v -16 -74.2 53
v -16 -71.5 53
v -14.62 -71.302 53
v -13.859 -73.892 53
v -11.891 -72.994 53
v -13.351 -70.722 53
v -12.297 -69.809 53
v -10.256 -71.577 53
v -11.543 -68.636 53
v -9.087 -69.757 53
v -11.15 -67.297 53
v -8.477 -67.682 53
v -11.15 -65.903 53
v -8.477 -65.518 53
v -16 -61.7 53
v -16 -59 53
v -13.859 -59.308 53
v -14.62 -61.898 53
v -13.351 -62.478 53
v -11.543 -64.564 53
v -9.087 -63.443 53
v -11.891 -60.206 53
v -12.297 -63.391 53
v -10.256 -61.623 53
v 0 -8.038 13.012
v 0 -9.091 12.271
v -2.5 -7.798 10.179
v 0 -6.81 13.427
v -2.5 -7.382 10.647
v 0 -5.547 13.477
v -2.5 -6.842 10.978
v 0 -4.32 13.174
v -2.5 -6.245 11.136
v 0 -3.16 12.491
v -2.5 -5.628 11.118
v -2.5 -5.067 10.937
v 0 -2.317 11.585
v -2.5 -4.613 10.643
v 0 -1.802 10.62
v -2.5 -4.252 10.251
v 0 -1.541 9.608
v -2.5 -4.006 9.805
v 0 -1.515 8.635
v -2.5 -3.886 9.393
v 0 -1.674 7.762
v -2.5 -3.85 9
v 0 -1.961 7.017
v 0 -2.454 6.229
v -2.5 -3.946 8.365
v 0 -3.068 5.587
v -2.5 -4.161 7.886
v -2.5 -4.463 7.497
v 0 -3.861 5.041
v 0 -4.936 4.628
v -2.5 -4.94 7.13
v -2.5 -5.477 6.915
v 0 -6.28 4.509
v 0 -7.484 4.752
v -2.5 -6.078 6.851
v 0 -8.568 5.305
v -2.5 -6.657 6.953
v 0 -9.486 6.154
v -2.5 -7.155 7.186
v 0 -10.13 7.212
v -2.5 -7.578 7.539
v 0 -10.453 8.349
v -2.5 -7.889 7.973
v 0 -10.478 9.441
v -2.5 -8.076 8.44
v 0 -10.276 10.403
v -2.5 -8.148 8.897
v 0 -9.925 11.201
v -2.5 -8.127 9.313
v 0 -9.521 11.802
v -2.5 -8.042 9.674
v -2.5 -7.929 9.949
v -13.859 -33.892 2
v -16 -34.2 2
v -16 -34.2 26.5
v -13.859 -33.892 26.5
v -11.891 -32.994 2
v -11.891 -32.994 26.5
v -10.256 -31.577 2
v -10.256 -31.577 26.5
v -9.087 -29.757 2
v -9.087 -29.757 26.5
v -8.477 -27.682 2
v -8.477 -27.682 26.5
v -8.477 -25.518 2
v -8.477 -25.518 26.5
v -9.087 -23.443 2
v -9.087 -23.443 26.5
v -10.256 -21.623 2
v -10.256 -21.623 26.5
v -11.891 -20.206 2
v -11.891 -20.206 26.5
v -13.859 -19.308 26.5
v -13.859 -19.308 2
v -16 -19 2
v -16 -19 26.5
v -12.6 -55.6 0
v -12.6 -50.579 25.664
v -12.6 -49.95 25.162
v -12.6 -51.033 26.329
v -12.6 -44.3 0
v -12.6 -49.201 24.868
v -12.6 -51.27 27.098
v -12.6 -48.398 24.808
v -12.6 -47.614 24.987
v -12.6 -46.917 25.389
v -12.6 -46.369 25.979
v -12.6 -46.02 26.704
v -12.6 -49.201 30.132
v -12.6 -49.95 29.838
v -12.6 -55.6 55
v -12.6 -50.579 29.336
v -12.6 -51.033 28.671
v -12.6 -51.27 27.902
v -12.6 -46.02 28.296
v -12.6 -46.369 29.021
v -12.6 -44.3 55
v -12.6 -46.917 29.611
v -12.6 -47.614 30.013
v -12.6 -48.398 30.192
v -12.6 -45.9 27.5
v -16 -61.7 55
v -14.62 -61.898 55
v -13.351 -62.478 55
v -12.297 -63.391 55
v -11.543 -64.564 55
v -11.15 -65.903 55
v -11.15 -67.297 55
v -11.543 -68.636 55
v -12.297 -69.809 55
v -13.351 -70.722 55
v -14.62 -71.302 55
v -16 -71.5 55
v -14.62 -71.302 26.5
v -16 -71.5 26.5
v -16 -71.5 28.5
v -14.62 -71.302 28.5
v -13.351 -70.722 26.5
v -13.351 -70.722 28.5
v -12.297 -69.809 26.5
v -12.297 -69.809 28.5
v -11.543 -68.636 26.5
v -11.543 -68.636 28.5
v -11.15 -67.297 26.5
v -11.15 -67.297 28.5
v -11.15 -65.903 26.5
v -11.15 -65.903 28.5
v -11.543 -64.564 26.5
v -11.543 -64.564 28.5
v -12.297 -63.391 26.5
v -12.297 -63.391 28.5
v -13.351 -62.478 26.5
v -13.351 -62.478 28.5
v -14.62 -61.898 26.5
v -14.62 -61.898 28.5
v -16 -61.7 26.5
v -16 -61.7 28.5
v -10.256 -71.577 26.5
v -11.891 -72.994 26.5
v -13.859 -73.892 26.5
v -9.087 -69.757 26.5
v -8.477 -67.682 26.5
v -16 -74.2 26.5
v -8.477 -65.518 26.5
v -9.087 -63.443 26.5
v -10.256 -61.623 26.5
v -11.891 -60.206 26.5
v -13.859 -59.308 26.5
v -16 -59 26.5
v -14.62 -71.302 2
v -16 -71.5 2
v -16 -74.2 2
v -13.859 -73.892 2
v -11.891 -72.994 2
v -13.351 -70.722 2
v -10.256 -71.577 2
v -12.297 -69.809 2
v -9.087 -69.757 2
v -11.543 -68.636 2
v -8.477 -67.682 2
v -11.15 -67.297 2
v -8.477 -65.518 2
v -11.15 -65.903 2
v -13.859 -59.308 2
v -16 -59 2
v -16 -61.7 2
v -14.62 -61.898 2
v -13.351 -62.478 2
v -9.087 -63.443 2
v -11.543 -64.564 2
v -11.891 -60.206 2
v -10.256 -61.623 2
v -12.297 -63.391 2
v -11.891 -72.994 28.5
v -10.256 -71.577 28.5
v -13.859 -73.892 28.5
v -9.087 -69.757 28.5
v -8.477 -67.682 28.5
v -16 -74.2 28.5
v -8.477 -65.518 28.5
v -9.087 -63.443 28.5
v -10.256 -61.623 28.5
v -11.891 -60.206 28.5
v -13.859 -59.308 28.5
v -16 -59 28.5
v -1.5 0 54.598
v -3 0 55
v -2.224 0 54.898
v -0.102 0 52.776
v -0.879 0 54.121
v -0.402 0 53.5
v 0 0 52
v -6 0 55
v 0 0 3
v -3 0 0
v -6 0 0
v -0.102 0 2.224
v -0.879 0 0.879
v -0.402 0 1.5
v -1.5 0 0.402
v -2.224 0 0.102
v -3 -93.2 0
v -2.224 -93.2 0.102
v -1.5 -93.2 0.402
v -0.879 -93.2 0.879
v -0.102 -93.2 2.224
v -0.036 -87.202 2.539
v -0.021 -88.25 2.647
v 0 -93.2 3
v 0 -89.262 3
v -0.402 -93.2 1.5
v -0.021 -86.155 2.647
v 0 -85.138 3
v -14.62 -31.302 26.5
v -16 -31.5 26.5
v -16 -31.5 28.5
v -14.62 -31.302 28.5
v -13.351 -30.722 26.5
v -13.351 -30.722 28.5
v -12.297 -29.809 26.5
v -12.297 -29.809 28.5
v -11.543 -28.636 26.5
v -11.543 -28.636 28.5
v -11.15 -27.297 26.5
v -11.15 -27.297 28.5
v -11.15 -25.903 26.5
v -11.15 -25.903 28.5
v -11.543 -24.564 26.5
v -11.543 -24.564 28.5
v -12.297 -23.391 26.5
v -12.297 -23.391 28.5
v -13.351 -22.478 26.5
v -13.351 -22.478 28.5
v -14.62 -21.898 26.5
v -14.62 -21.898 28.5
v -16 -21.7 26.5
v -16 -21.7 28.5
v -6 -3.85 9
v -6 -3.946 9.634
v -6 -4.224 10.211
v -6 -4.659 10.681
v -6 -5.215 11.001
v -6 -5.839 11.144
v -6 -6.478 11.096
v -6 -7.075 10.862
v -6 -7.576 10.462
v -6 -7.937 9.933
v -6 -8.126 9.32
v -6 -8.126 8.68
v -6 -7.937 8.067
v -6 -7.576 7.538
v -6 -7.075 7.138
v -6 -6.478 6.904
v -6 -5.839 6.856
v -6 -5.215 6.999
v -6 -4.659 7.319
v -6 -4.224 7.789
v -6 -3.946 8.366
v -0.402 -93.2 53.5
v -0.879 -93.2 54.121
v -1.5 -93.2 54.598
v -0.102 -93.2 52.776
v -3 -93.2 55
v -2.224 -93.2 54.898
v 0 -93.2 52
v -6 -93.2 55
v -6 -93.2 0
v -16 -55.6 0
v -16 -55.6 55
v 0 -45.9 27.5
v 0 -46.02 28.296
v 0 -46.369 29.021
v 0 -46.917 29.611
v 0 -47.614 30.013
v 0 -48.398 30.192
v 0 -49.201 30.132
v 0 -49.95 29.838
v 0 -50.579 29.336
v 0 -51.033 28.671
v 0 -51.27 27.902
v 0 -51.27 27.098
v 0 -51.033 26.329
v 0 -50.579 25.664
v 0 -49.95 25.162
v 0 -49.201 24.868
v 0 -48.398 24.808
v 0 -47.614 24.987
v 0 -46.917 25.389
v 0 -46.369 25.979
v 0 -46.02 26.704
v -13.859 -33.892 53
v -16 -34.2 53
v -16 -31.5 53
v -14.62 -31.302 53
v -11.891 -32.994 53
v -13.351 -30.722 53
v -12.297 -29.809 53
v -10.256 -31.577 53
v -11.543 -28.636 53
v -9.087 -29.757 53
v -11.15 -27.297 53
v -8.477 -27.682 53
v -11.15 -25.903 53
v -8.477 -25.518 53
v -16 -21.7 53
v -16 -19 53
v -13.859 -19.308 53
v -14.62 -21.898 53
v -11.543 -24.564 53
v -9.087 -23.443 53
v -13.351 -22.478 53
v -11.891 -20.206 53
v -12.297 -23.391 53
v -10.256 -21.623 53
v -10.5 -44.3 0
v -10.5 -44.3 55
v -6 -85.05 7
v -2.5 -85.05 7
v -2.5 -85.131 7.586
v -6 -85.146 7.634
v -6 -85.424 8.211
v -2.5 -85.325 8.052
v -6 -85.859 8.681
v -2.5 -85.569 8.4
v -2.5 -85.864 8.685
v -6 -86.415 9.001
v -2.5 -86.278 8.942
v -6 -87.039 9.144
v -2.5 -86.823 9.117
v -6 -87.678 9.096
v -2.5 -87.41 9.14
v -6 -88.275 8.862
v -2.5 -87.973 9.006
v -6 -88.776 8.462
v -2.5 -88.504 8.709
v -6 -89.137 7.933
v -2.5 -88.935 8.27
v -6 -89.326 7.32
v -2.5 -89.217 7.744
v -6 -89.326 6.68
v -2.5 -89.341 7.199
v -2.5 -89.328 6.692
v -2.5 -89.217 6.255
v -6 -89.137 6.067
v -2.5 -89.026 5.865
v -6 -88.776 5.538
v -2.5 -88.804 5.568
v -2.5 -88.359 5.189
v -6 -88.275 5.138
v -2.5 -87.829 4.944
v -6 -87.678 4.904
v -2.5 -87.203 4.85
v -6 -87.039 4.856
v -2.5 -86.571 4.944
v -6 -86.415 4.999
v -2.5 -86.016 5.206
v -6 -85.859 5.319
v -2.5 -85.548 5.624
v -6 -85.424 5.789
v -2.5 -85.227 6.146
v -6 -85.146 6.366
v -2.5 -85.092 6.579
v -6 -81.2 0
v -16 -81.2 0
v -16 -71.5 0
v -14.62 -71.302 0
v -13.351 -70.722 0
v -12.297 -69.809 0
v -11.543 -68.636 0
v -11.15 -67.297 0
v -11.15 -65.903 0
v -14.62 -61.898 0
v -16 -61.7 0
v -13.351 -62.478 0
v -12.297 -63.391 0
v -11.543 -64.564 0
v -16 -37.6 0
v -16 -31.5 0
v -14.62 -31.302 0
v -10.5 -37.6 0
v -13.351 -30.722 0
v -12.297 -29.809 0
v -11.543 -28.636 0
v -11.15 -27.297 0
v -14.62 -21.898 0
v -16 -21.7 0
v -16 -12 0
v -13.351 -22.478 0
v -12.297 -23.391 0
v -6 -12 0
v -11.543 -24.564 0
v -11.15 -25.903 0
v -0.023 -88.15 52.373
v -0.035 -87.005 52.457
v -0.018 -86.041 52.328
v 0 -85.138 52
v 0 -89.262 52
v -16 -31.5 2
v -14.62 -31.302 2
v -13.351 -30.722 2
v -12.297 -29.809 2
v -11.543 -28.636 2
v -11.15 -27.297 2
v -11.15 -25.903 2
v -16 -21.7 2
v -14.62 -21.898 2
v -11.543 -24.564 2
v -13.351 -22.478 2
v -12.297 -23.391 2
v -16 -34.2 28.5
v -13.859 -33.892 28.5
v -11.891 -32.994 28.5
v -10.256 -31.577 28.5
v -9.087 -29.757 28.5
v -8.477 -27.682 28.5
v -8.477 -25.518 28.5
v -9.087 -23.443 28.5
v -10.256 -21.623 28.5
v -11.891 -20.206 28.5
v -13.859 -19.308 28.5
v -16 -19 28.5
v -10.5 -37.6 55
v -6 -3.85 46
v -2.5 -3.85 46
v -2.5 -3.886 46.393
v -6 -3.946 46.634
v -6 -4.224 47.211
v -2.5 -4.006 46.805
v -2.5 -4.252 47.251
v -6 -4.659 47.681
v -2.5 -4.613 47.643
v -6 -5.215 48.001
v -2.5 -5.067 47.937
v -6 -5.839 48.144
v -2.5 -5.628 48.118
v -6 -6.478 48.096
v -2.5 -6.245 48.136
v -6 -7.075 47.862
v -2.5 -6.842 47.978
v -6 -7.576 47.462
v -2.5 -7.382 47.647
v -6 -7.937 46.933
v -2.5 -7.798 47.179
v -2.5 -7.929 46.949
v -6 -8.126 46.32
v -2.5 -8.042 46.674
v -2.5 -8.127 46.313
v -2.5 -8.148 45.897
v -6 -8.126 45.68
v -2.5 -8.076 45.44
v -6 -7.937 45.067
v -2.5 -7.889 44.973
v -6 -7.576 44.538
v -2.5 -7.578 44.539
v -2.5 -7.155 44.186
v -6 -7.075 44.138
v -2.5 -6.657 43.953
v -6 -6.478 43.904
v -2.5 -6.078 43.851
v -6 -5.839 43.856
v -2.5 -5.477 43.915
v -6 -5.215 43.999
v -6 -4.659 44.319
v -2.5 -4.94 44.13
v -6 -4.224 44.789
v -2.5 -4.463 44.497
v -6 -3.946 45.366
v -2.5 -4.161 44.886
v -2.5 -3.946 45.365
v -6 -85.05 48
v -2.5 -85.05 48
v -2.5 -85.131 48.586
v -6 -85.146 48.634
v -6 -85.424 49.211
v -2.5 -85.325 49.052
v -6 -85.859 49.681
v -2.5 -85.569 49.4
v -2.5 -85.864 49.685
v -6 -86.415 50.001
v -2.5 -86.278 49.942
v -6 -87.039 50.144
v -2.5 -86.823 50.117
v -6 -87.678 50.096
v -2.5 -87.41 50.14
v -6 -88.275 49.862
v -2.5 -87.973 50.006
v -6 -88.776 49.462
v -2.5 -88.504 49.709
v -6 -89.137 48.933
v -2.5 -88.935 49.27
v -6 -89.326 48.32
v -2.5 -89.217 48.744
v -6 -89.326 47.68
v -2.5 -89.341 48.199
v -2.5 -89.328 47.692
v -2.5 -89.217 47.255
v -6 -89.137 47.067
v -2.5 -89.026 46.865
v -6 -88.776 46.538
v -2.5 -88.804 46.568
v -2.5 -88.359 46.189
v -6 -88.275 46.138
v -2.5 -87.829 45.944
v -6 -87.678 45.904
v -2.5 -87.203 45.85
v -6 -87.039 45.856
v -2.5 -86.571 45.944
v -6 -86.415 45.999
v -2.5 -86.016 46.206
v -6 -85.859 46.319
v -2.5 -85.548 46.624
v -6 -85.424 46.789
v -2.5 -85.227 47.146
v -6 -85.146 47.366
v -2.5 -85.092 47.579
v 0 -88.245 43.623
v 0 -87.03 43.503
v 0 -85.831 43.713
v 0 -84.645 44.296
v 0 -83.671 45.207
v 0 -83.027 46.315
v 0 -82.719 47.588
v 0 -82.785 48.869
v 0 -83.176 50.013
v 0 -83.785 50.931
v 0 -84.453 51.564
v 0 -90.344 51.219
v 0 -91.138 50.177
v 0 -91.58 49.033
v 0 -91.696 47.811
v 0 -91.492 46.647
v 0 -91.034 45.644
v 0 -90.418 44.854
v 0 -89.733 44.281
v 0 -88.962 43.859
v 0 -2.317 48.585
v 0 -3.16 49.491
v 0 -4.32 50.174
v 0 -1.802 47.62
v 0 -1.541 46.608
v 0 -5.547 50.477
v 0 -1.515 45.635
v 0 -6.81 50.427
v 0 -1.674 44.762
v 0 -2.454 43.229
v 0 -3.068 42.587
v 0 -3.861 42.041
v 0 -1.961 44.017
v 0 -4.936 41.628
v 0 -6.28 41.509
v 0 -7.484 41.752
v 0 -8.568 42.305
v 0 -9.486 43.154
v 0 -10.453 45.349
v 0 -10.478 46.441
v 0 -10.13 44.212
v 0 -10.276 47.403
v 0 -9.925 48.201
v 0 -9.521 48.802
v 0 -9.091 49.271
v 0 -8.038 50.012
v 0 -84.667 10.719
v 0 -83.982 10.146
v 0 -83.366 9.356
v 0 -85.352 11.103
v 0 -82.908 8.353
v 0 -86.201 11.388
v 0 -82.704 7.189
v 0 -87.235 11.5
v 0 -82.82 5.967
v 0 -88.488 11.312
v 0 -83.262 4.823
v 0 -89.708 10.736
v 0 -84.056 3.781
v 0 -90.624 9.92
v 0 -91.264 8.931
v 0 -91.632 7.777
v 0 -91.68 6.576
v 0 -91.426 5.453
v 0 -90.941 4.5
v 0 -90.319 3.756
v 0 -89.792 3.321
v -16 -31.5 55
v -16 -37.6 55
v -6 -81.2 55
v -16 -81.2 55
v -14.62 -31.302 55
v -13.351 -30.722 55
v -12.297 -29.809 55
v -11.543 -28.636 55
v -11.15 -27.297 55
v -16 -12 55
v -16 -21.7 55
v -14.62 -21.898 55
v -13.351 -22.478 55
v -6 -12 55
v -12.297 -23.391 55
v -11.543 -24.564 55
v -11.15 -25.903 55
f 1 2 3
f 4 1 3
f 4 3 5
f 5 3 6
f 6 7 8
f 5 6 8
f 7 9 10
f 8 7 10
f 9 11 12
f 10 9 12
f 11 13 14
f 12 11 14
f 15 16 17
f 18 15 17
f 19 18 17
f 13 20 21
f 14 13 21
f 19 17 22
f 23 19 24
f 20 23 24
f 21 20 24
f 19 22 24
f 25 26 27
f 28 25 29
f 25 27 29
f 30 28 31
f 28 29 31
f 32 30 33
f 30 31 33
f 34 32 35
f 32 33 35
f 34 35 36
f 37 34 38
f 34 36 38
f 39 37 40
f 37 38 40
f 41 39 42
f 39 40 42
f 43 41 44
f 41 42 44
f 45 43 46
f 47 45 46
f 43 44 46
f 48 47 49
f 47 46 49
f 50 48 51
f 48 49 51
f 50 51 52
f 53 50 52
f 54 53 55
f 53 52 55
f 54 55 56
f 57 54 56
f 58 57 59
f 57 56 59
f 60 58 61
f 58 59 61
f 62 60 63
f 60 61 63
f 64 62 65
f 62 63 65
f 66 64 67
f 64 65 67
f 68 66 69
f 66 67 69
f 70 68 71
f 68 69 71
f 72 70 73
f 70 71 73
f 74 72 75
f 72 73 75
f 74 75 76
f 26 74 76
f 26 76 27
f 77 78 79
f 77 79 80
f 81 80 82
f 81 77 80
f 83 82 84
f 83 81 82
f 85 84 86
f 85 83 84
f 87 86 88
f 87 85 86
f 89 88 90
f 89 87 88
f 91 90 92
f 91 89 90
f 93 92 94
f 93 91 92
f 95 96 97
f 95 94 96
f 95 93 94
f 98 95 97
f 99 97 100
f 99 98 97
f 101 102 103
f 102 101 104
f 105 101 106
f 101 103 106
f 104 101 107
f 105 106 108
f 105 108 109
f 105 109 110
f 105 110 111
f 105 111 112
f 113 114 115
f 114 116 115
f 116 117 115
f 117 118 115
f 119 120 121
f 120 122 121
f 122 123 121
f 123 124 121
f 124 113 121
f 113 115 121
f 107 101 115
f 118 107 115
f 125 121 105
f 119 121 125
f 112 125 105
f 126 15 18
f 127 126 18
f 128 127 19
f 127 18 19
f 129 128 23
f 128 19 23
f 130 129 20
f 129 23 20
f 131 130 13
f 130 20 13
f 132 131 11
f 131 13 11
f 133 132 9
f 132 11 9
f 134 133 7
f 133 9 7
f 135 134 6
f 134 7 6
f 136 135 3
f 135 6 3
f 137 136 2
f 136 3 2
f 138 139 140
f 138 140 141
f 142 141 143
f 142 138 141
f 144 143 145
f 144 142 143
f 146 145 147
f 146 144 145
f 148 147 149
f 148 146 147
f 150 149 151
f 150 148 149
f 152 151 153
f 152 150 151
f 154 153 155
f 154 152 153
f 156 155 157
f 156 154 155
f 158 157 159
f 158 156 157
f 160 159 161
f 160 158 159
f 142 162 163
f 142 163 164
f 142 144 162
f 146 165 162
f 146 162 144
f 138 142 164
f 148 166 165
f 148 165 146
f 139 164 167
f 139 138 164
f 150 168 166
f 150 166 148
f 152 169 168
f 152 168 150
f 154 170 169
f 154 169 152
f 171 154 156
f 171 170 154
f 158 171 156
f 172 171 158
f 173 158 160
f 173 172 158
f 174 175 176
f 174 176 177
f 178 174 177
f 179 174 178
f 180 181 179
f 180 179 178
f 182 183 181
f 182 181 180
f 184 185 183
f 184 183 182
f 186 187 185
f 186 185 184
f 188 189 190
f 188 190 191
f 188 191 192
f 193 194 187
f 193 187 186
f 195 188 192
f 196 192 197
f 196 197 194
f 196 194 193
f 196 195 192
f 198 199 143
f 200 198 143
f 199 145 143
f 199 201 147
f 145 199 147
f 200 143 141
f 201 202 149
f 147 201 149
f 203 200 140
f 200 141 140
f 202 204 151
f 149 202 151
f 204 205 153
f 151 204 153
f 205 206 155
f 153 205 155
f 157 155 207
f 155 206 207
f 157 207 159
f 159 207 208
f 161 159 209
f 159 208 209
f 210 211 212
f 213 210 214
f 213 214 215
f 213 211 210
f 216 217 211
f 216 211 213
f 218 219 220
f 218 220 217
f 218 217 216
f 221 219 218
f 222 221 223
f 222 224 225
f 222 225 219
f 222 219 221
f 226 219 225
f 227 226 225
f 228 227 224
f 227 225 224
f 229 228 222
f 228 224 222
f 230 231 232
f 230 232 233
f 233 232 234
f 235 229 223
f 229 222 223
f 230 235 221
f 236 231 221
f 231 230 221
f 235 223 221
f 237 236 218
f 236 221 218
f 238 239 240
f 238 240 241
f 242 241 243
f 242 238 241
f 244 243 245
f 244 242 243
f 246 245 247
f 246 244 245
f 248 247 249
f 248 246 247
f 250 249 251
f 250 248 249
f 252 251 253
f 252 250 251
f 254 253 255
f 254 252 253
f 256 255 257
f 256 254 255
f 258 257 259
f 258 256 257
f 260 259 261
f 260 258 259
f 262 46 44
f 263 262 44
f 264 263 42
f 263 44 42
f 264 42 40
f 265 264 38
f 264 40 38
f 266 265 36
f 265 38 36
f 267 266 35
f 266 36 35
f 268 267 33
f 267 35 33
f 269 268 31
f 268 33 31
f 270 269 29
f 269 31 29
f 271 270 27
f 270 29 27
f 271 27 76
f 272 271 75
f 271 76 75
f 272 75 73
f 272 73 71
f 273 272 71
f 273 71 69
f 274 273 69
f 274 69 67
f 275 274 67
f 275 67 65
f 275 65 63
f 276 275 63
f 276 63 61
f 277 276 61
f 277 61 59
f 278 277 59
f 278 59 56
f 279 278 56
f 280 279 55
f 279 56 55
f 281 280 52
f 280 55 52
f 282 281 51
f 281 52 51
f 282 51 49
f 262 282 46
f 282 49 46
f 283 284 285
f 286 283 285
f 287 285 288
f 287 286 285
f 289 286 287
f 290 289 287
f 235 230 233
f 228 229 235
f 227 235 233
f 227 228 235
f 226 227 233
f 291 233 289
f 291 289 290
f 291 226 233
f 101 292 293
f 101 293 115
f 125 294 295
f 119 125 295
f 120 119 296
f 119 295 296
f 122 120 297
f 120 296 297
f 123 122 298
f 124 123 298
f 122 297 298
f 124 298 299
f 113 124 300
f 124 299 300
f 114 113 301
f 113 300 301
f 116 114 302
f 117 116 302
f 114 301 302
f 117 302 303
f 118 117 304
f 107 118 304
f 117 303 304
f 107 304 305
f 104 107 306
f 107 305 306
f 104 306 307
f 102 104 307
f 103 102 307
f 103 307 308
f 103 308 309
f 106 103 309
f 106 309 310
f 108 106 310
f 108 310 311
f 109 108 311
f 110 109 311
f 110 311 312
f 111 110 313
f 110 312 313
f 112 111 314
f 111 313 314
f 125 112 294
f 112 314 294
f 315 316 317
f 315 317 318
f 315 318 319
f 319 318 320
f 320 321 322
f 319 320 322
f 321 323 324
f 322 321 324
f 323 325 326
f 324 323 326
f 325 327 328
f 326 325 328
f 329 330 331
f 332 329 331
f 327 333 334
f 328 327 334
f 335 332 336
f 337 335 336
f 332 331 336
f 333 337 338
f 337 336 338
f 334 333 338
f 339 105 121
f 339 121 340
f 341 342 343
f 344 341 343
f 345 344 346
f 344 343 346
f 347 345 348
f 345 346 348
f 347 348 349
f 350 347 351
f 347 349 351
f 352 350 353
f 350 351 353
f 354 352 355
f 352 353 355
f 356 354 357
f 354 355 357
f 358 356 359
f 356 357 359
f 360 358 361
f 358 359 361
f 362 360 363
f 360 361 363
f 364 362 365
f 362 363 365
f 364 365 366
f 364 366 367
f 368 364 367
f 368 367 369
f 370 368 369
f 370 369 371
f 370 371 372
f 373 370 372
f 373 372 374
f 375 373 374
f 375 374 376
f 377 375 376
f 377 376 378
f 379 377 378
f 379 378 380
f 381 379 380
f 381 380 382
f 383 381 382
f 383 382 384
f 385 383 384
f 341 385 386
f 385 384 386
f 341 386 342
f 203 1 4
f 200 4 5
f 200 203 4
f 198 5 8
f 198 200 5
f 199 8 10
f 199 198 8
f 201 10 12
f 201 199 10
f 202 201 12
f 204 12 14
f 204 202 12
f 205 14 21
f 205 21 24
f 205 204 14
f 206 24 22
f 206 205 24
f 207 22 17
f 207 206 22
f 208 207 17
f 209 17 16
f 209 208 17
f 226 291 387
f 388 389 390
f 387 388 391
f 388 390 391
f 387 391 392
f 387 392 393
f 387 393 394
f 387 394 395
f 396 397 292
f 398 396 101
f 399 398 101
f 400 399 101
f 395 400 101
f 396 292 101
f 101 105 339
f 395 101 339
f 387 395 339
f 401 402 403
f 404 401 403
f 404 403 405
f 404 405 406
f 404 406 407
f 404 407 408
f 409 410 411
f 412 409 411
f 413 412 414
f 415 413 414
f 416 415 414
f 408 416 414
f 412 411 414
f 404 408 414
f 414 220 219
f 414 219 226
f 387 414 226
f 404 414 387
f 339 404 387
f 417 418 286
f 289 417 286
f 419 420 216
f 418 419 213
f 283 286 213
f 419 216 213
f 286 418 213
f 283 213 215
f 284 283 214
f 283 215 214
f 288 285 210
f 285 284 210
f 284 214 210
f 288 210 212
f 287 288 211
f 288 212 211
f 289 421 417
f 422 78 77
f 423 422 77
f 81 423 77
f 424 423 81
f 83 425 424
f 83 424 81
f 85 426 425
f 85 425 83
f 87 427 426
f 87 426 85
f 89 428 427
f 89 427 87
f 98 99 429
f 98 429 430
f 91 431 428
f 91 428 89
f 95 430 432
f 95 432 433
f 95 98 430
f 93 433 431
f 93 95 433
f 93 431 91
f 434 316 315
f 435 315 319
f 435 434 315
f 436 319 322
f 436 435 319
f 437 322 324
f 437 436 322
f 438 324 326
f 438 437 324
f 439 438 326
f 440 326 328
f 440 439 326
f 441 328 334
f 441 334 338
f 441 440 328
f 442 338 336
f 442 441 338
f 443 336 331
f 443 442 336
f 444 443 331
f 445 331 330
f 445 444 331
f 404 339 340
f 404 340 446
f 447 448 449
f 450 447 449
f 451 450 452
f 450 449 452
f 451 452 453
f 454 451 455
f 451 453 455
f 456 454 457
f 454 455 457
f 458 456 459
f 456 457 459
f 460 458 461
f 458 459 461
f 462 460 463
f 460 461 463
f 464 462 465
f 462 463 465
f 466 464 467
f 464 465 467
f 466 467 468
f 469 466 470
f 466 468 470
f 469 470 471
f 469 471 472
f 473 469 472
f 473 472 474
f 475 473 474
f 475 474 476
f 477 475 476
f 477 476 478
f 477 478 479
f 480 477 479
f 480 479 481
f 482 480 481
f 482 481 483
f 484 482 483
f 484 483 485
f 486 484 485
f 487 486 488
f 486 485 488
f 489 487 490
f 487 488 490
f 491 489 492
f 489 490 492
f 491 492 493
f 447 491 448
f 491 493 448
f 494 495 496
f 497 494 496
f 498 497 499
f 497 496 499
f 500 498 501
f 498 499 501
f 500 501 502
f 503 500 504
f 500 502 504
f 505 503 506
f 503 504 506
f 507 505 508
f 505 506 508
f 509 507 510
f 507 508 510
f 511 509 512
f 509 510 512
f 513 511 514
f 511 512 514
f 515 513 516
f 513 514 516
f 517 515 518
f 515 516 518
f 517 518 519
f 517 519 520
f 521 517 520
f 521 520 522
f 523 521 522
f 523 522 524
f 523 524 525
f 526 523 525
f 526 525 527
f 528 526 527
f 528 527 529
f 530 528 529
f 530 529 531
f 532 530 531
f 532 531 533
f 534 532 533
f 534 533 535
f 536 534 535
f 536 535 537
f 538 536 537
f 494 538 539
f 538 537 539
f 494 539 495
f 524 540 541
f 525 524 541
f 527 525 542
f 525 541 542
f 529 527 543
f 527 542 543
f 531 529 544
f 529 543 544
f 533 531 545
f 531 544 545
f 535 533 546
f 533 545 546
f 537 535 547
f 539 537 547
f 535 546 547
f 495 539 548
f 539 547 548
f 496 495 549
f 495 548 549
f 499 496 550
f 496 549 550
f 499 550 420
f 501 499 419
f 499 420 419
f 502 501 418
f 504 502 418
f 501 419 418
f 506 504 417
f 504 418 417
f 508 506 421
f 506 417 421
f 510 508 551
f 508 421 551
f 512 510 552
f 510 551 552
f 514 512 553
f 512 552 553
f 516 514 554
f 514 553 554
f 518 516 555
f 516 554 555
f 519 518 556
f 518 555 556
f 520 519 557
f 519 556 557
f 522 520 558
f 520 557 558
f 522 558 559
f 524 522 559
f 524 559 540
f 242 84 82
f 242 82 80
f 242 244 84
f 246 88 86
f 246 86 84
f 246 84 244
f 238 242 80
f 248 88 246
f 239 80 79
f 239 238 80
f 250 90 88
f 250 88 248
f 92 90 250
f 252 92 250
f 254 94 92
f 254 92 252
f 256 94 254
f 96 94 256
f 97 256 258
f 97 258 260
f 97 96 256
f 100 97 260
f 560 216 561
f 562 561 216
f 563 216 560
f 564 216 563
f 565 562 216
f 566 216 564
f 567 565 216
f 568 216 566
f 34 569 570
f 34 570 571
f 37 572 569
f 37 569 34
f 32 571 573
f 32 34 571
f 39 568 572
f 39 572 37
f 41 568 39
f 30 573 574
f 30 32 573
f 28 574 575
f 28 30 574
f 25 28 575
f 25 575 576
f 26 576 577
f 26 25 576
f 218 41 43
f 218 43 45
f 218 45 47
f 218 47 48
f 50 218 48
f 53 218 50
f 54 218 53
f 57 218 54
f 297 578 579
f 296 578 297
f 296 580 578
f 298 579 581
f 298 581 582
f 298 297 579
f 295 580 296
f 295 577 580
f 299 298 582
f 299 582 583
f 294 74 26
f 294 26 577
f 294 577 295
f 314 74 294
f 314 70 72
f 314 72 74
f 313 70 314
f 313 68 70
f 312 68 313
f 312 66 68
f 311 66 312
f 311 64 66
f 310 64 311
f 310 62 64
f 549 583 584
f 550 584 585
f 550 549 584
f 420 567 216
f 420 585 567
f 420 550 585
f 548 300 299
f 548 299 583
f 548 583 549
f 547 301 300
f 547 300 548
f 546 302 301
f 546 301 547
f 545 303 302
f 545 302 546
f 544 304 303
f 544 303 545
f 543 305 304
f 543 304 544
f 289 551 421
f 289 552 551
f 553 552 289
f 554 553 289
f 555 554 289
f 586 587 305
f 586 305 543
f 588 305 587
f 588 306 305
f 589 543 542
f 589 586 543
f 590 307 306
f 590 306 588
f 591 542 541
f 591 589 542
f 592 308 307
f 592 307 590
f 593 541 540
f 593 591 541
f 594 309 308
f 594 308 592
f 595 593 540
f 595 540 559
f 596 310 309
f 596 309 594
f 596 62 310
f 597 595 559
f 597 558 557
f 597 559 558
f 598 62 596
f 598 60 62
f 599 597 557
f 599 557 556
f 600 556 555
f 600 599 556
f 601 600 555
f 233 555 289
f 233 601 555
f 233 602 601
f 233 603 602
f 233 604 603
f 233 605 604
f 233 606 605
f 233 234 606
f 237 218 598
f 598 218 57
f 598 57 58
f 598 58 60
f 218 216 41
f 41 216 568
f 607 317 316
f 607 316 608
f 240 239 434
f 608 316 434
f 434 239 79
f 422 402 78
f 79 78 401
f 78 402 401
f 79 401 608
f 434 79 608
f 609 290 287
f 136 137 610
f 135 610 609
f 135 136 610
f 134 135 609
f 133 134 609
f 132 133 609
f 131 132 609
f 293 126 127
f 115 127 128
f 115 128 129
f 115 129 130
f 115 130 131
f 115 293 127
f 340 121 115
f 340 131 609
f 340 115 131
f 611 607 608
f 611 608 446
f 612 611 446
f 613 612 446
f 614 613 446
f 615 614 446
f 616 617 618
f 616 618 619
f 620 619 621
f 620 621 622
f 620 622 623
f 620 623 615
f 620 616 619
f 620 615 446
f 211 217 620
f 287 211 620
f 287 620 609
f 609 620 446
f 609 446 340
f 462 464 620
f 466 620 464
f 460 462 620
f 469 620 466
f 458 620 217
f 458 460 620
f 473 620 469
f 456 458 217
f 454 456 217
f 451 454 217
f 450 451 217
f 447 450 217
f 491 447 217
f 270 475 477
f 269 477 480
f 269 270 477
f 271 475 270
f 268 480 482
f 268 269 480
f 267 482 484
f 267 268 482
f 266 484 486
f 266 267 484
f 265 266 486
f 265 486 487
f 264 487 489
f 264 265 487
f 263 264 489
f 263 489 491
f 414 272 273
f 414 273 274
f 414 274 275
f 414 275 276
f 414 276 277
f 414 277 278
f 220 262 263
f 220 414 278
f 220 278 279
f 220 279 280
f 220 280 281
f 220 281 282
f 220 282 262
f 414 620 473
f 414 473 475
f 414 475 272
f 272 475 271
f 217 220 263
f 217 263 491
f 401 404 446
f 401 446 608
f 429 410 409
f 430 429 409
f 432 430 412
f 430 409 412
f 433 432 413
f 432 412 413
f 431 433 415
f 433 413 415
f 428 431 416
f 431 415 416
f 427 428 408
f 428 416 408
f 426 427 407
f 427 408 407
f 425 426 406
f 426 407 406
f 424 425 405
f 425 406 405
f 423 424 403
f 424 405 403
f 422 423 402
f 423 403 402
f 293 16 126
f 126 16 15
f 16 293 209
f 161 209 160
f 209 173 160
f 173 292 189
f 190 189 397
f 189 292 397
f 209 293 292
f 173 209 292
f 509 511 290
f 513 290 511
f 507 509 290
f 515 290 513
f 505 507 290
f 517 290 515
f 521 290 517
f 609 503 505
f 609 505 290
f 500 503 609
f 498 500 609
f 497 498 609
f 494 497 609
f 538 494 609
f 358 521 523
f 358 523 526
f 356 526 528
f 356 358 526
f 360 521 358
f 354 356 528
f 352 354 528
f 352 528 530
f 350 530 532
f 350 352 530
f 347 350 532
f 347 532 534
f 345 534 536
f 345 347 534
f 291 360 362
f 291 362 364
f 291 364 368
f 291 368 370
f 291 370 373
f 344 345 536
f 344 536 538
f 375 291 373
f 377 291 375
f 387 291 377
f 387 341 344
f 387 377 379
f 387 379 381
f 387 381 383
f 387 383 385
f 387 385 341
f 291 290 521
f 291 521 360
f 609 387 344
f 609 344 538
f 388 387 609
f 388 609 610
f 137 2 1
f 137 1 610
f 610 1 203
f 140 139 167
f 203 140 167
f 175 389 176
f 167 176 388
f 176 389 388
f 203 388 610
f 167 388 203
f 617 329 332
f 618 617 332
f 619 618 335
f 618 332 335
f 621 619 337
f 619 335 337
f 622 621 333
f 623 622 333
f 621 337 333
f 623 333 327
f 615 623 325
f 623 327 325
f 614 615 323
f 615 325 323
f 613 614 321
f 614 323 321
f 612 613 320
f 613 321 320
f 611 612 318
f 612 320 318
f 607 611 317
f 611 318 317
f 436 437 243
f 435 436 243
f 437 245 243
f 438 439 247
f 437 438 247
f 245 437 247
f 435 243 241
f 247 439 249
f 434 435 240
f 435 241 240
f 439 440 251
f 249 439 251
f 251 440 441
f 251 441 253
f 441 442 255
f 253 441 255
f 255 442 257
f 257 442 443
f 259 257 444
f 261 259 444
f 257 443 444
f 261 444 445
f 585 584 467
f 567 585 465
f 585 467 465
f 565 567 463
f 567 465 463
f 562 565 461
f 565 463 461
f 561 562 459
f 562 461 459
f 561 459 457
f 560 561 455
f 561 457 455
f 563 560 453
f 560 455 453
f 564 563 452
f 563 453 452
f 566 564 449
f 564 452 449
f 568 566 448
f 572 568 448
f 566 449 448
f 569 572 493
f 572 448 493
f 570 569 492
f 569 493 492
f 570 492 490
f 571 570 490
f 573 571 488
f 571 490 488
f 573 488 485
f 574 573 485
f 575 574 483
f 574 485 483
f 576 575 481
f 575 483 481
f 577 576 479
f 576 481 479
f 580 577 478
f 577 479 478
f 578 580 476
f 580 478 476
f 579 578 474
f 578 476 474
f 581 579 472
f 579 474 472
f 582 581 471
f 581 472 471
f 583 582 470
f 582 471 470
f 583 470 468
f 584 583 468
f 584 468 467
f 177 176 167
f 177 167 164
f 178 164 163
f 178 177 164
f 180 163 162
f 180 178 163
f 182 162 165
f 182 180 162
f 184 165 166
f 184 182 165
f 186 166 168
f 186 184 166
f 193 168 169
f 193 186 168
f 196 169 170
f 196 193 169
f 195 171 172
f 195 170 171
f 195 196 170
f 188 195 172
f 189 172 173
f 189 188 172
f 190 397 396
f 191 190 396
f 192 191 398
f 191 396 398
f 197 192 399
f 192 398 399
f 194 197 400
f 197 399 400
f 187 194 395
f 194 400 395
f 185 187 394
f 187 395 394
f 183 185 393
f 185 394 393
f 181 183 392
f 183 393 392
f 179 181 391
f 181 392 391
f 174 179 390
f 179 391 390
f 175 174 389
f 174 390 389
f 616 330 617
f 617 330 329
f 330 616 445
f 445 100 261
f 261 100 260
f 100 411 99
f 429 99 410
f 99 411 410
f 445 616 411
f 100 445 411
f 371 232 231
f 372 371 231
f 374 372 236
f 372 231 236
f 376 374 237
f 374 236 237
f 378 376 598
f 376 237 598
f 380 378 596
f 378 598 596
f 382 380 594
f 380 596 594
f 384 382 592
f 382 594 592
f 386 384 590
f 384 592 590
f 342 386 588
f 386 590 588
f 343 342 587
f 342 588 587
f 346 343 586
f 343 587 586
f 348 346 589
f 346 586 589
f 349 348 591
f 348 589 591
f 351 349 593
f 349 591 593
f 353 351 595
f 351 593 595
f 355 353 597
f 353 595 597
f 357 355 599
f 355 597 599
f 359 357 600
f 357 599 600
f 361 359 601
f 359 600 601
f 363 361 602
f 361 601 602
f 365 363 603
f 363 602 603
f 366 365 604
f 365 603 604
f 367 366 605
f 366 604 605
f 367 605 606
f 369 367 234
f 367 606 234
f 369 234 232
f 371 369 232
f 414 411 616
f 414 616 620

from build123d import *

# Parameters (mm, degrees)
BOSS_EXTRUDE1_DEPTH = 55
BOSS_EXTRUDE2_START = 2
BOSS_EXTRUDE2_DEPTH = 2
BOSS_EXTRUDE3_START = 2
BOSS_EXTRUDE3_DEPTH = 2
BOSS_EXTRUDE5_START = 2
BOSS_EXTRUDE5_DEPTH = 2
BOSS_EXTRUDE6_DEPTH = 2
SKETCH7_W           = 3.4
SKETCH7_H           = 11.3
CUT_EXTRUDE2_DEPTH  = 55
SKETCH8_R           = 2.15
CUT_EXTRUDE3_DEPTH  = 6
SKETCH9_R           = 2.7
CUT_EXTRUDE4_DEPTH  = 12.6
LPATTERN1_COUNT     = 2
LPATTERN1_PITCH     = 37
LPATTERN2_COUNT     = 2
LPATTERN2_PITCH     = 41
FILLET1_R           = 3


with BuildPart() as part:
    # Sketch1 → Boss-Extrude1 (new body)
    with BuildSketch(Plane.XY):
        with BuildLine():
            Line((0, 0), (0, -93.2))
            Line((0, -93.2), (-6, -93.2))
            Line((-6, -93.2), (-6, -81.2))
            Line((-6, -81.2), (-16, -81.2))
            Line((-16, -81.2), (-16, -74.2))
            ThreePointArc((-16, -74.2), (-8.4, -66.6), (-16, -59))
            Line((-16, -59), (-16, -44.3))
            Line((-16, -44.3), (-10.5, -44.3))
            Line((-10.5, -44.3), (-10.5, -37.6))
            Line((-10.5, -37.6), (-16, -37.6))
            Line((-16, -37.6), (-16, -34.2))
            ThreePointArc((-16, -34.2), (-8.4, -26.6), (-16, -19))
            Line((-16, -19), (-16, -12))
            Line((-16, -12), (-6, -12))
            Line((-6, -12), (-6, 0))
            Line((-6, 0), (0, 0))
        make_face()
    extrude(amount=BOSS_EXTRUDE1_DEPTH)

    # Sketch2 → Boss-Extrude2 (add)
    with BuildSketch(Plane(origin=(0, 0, 28.5), x_dir=(-1, 0, 0), z_dir=(0, 0, -1)).offset(BOSS_EXTRUDE2_START)):
        with BuildLine():
            Line((16, -34.2), (16, -31.5))
            ThreePointArc((16, -31.5), (11.1, -26.6), (16, -21.7))
            Line((16, -21.7), (16, -19))
            ThreePointArc((16, -19), (8.4, -26.6), (16, -34.2))
        make_face()
    extrude(amount=-BOSS_EXTRUDE2_DEPTH)

    # Sketch3 → Boss-Extrude3 (add)
    with BuildSketch(Plane(origin=(0, 0, 28.5), x_dir=(-1, 0, 0), z_dir=(0, 0, -1)).offset(BOSS_EXTRUDE3_START)):
        with BuildLine():
            Line((16, -74.2), (16, -71.5))
            ThreePointArc((16, -71.5), (11.1, -66.6), (16, -61.7))
            Line((16, -61.7), (16, -59))
            ThreePointArc((16, -59), (8.4, -66.6), (16, -74.2))
        make_face()
    extrude(amount=-BOSS_EXTRUDE3_DEPTH)

    # Sketch4 → Boss-Extrude5 (add)
    with BuildSketch(Plane(origin=(0, 0, 2), x_dir=(-1, 0, 0), z_dir=(0, 0, -1)).offset(BOSS_EXTRUDE5_START)):
        with BuildLine():
            Line((16, -59), (16, -61.7))
            ThreePointArc((16, -61.7), (11.1, -66.6), (16, -71.5))
            Line((16, -71.5), (16, -74.2))
            ThreePointArc((16, -74.2), (8.4, -66.6), (16, -59))
        make_face()
        with BuildLine():
            Line((16, -19), (16, -21.7))
            ThreePointArc((16, -21.7), (11.1, -26.6), (16, -31.5))
            Line((16, -31.5), (16, -34.2))
            ThreePointArc((16, -34.2), (8.4, -26.6), (16, -19))
        make_face()
    extrude(amount=-BOSS_EXTRUDE5_DEPTH)

    # Sketch5 → Boss-Extrude6 (add)
    with BuildSketch(Plane(origin=(0, 0, 53), x_dir=(-1, 0, 0), z_dir=(0, 0, -1))):
        with BuildLine():
            Line((16, -19), (16, -21.7))
            ThreePointArc((16, -21.7), (11.1, -26.6), (16, -31.5))
            Line((16, -31.5), (16, -34.2))
            ThreePointArc((16, -34.2), (8.4, -26.6), (16, -19))
        make_face()
        with BuildLine():
            Line((16, -59), (16, -61.7))
            ThreePointArc((16, -61.7), (11.1, -66.6), (16, -71.5))
            Line((16, -71.5), (16, -74.2))
            ThreePointArc((16, -74.2), (8.4, -66.6), (16, -59))
        make_face()
    extrude(amount=-BOSS_EXTRUDE6_DEPTH)

    # Sketch7 → Cut-Extrude2 (cut)
    with BuildSketch(Plane.XY.offset(55)):
        with Locations((-14.3, -49.95)):
            Rectangle(SKETCH7_W, SKETCH7_H)
    extrude(amount=-CUT_EXTRUDE2_DEPTH, mode=Mode.SUBTRACT)

    # Sketch8 → Cut-Extrude3 (cut)
    with BuildSketch(Plane(origin=(0, 0, 0), x_dir=(0, 0, -1), z_dir=(1, 0, 0))):
        with Locations(Location((-46, -6, 0), (0, 0, 90))):
            Circle(SKETCH8_R)
        with Locations(Location((-9, -6, 0), (0, 0, 90))):
            Circle(SKETCH8_R)
        with Locations(Location((-7, -87.2, 0), (0, 0, 90))):
            Circle(SKETCH8_R)
        with Locations(Location((-48, -87.2, 0), (0, 0, 90))):
            Circle(SKETCH8_R)
    extrude(amount=-CUT_EXTRUDE3_DEPTH, mode=Mode.SUBTRACT)

    # Sketch9 → Cut-Extrude4 (cut)
    with BuildSketch(Plane(origin=(0, 0, 0), x_dir=(0, 0, -1), z_dir=(1, 0, 0))):
        with Locations(Location((-27.5, -48.6, 0), (0, 0, 90))):
            Circle(SKETCH9_R)
    extrude(amount=-CUT_EXTRUDE4_DEPTH, mode=Mode.SUBTRACT)

    # Cut-Loft1: read off the stored shape, not the designer's step
    # Cut-Loft1: loft between two sections, ruled curve by curve
    cut_loft1_from = [
        Edge.make_bspline([(0, -9.090752309, 49.270665095), (0, -2.54942212, 55.452169714), (0, 3.632082499, 48.910839524), (0, -2.909247691, 42.729334905), (0, -9.45057788, 36.547830286), (0, -15.632082499, 43.089160476), (0, -9.090752309, 49.270665095)], [0, 0, 0, 0, 0.5, 0.5, 0.5, 1, 1, 1, 1], 3, [1, 0.333333333, 0.333333333, 1, 0.333333333, 0.333333333, 1]),
    ]
    cut_loft1_to = [
        Edge.make_bspline([(-2.5, -7.797727139, 47.179269746), (-2.5, -5.439187646, 50.774724024), (-2.5, -1.843733369, 48.416184531), (-2.5, -4.202272861, 44.820730254), (-2.5, -6.560812354, 41.225275976), (-2.5, -10.156266631, 43.583815469), (-2.5, -7.797727139, 47.179269746)], [0, 0, 0, 0, 0.5, 0.5, 0.5, 1, 1, 1, 1], 3, [1, 0.333333333, 0.333333333, 1, 0.333333333, 0.333333333, 1]),
    ]
    cut_loft1 = Solid(Shell([*[Face.make_surface_from_curves(cut_loft1_from[k], cut_loft1_to[k]) for k in range(1)], Face(Wire(cut_loft1_from)), Face(Wire(cut_loft1_to))]))
    add(cut_loft1, mode=Mode.SUBTRACT)

    # LPattern1: Cut-Loft1 ×2
    with Locations(*[(0, 0, -i * LPATTERN1_PITCH) for i in range(1, LPATTERN1_COUNT)]):
        add(cut_loft1, mode=Mode.SUBTRACT)

    # Cut-Loft2: read off the stored shape, not the designer's step
    # Cut-Loft2: loft between two sections, ruled curve by curve
    cut_loft2_from = [
        Edge.make_bspline([(-2.5, -88.803773463, 46.568074485), (-2.5, -85.939922433, 43.36052756), (-2.5, -82.732375507, 46.22437859), (-2.5, -85.596226537, 49.431925515), (-2.5, -88.460077567, 52.63947244), (-2.5, -91.667624493, 49.77562141), (-2.5, -88.803773463, 46.568074485)], [0, 0, 0, 0, 0.5, 0.5, 0.5, 1, 1, 1, 1], 3, [1, 0.333333333, 0.333333333, 1, 0.333333333, 0.333333333, 1]),
    ]
    cut_loft2_to = [
        Edge.make_bspline([(0, -88.245004687, 43.623018711), (0, -79.491042109, 41.533009337), (0, -77.401032735, 50.286971915), (0, -86.154995313, 52.376981289), (0, -94.908957891, 54.466990663), (0, -96.998967265, 45.713028085), (0, -88.245004687, 43.623018711)], [0, 0, 0, 0, 0.5, 0.5, 0.5, 1, 1, 1, 1], 3, [1, 0.333333333, 0.333333333, 1, 0.333333333, 0.333333333, 1]),
    ]
    cut_loft2 = Solid(Shell([*[Face.make_surface_from_curves(cut_loft2_from[k], cut_loft2_to[k]) for k in range(1)], Face(Wire(cut_loft2_from)), Face(Wire(cut_loft2_to))]))
    add(cut_loft2, mode=Mode.SUBTRACT)

    # LPattern2: Cut-Loft2 ×2
    with Locations(*[(0, 0, -i * LPATTERN2_PITCH) for i in range(1, LPATTERN2_COUNT)]):
        add(cut_loft2, mode=Mode.SUBTRACT)

    # Fillet1
    # the kernel refuses this fillet: 3 mm, written as the material it takes off along each edge
    with BuildSketch(Plane(origin=(0, 7.5, 0), x_dir=(-1, 0, 0), z_dir=(0, -1, 0))) as fillet1_piece_1:
        with BuildLine():
            CenterArc((FILLET1_R, -FILLET1_R), FILLET1_R, 90, 90)
            Line((0, -FILLET1_R), (0, 0))
            Line((0, 0), (FILLET1_R, 0))
        make_face()
    extrude(amount=108.2, mode=Mode.SUBTRACT)
    with BuildSketch(Plane(origin=(0, 7.5, 55), x_dir=(-1, 0, 0), z_dir=(0, -1, 0))) as fillet1_piece_2:
        with BuildLine():
            CenterArc((FILLET1_R, FILLET1_R), FILLET1_R, 180, 90)
            Line((0, FILLET1_R), (0, 0))
            Line((0, 0), (FILLET1_R, 0))
        make_face()
    extrude(amount=108.2, mode=Mode.SUBTRACT)


solid = part.part
